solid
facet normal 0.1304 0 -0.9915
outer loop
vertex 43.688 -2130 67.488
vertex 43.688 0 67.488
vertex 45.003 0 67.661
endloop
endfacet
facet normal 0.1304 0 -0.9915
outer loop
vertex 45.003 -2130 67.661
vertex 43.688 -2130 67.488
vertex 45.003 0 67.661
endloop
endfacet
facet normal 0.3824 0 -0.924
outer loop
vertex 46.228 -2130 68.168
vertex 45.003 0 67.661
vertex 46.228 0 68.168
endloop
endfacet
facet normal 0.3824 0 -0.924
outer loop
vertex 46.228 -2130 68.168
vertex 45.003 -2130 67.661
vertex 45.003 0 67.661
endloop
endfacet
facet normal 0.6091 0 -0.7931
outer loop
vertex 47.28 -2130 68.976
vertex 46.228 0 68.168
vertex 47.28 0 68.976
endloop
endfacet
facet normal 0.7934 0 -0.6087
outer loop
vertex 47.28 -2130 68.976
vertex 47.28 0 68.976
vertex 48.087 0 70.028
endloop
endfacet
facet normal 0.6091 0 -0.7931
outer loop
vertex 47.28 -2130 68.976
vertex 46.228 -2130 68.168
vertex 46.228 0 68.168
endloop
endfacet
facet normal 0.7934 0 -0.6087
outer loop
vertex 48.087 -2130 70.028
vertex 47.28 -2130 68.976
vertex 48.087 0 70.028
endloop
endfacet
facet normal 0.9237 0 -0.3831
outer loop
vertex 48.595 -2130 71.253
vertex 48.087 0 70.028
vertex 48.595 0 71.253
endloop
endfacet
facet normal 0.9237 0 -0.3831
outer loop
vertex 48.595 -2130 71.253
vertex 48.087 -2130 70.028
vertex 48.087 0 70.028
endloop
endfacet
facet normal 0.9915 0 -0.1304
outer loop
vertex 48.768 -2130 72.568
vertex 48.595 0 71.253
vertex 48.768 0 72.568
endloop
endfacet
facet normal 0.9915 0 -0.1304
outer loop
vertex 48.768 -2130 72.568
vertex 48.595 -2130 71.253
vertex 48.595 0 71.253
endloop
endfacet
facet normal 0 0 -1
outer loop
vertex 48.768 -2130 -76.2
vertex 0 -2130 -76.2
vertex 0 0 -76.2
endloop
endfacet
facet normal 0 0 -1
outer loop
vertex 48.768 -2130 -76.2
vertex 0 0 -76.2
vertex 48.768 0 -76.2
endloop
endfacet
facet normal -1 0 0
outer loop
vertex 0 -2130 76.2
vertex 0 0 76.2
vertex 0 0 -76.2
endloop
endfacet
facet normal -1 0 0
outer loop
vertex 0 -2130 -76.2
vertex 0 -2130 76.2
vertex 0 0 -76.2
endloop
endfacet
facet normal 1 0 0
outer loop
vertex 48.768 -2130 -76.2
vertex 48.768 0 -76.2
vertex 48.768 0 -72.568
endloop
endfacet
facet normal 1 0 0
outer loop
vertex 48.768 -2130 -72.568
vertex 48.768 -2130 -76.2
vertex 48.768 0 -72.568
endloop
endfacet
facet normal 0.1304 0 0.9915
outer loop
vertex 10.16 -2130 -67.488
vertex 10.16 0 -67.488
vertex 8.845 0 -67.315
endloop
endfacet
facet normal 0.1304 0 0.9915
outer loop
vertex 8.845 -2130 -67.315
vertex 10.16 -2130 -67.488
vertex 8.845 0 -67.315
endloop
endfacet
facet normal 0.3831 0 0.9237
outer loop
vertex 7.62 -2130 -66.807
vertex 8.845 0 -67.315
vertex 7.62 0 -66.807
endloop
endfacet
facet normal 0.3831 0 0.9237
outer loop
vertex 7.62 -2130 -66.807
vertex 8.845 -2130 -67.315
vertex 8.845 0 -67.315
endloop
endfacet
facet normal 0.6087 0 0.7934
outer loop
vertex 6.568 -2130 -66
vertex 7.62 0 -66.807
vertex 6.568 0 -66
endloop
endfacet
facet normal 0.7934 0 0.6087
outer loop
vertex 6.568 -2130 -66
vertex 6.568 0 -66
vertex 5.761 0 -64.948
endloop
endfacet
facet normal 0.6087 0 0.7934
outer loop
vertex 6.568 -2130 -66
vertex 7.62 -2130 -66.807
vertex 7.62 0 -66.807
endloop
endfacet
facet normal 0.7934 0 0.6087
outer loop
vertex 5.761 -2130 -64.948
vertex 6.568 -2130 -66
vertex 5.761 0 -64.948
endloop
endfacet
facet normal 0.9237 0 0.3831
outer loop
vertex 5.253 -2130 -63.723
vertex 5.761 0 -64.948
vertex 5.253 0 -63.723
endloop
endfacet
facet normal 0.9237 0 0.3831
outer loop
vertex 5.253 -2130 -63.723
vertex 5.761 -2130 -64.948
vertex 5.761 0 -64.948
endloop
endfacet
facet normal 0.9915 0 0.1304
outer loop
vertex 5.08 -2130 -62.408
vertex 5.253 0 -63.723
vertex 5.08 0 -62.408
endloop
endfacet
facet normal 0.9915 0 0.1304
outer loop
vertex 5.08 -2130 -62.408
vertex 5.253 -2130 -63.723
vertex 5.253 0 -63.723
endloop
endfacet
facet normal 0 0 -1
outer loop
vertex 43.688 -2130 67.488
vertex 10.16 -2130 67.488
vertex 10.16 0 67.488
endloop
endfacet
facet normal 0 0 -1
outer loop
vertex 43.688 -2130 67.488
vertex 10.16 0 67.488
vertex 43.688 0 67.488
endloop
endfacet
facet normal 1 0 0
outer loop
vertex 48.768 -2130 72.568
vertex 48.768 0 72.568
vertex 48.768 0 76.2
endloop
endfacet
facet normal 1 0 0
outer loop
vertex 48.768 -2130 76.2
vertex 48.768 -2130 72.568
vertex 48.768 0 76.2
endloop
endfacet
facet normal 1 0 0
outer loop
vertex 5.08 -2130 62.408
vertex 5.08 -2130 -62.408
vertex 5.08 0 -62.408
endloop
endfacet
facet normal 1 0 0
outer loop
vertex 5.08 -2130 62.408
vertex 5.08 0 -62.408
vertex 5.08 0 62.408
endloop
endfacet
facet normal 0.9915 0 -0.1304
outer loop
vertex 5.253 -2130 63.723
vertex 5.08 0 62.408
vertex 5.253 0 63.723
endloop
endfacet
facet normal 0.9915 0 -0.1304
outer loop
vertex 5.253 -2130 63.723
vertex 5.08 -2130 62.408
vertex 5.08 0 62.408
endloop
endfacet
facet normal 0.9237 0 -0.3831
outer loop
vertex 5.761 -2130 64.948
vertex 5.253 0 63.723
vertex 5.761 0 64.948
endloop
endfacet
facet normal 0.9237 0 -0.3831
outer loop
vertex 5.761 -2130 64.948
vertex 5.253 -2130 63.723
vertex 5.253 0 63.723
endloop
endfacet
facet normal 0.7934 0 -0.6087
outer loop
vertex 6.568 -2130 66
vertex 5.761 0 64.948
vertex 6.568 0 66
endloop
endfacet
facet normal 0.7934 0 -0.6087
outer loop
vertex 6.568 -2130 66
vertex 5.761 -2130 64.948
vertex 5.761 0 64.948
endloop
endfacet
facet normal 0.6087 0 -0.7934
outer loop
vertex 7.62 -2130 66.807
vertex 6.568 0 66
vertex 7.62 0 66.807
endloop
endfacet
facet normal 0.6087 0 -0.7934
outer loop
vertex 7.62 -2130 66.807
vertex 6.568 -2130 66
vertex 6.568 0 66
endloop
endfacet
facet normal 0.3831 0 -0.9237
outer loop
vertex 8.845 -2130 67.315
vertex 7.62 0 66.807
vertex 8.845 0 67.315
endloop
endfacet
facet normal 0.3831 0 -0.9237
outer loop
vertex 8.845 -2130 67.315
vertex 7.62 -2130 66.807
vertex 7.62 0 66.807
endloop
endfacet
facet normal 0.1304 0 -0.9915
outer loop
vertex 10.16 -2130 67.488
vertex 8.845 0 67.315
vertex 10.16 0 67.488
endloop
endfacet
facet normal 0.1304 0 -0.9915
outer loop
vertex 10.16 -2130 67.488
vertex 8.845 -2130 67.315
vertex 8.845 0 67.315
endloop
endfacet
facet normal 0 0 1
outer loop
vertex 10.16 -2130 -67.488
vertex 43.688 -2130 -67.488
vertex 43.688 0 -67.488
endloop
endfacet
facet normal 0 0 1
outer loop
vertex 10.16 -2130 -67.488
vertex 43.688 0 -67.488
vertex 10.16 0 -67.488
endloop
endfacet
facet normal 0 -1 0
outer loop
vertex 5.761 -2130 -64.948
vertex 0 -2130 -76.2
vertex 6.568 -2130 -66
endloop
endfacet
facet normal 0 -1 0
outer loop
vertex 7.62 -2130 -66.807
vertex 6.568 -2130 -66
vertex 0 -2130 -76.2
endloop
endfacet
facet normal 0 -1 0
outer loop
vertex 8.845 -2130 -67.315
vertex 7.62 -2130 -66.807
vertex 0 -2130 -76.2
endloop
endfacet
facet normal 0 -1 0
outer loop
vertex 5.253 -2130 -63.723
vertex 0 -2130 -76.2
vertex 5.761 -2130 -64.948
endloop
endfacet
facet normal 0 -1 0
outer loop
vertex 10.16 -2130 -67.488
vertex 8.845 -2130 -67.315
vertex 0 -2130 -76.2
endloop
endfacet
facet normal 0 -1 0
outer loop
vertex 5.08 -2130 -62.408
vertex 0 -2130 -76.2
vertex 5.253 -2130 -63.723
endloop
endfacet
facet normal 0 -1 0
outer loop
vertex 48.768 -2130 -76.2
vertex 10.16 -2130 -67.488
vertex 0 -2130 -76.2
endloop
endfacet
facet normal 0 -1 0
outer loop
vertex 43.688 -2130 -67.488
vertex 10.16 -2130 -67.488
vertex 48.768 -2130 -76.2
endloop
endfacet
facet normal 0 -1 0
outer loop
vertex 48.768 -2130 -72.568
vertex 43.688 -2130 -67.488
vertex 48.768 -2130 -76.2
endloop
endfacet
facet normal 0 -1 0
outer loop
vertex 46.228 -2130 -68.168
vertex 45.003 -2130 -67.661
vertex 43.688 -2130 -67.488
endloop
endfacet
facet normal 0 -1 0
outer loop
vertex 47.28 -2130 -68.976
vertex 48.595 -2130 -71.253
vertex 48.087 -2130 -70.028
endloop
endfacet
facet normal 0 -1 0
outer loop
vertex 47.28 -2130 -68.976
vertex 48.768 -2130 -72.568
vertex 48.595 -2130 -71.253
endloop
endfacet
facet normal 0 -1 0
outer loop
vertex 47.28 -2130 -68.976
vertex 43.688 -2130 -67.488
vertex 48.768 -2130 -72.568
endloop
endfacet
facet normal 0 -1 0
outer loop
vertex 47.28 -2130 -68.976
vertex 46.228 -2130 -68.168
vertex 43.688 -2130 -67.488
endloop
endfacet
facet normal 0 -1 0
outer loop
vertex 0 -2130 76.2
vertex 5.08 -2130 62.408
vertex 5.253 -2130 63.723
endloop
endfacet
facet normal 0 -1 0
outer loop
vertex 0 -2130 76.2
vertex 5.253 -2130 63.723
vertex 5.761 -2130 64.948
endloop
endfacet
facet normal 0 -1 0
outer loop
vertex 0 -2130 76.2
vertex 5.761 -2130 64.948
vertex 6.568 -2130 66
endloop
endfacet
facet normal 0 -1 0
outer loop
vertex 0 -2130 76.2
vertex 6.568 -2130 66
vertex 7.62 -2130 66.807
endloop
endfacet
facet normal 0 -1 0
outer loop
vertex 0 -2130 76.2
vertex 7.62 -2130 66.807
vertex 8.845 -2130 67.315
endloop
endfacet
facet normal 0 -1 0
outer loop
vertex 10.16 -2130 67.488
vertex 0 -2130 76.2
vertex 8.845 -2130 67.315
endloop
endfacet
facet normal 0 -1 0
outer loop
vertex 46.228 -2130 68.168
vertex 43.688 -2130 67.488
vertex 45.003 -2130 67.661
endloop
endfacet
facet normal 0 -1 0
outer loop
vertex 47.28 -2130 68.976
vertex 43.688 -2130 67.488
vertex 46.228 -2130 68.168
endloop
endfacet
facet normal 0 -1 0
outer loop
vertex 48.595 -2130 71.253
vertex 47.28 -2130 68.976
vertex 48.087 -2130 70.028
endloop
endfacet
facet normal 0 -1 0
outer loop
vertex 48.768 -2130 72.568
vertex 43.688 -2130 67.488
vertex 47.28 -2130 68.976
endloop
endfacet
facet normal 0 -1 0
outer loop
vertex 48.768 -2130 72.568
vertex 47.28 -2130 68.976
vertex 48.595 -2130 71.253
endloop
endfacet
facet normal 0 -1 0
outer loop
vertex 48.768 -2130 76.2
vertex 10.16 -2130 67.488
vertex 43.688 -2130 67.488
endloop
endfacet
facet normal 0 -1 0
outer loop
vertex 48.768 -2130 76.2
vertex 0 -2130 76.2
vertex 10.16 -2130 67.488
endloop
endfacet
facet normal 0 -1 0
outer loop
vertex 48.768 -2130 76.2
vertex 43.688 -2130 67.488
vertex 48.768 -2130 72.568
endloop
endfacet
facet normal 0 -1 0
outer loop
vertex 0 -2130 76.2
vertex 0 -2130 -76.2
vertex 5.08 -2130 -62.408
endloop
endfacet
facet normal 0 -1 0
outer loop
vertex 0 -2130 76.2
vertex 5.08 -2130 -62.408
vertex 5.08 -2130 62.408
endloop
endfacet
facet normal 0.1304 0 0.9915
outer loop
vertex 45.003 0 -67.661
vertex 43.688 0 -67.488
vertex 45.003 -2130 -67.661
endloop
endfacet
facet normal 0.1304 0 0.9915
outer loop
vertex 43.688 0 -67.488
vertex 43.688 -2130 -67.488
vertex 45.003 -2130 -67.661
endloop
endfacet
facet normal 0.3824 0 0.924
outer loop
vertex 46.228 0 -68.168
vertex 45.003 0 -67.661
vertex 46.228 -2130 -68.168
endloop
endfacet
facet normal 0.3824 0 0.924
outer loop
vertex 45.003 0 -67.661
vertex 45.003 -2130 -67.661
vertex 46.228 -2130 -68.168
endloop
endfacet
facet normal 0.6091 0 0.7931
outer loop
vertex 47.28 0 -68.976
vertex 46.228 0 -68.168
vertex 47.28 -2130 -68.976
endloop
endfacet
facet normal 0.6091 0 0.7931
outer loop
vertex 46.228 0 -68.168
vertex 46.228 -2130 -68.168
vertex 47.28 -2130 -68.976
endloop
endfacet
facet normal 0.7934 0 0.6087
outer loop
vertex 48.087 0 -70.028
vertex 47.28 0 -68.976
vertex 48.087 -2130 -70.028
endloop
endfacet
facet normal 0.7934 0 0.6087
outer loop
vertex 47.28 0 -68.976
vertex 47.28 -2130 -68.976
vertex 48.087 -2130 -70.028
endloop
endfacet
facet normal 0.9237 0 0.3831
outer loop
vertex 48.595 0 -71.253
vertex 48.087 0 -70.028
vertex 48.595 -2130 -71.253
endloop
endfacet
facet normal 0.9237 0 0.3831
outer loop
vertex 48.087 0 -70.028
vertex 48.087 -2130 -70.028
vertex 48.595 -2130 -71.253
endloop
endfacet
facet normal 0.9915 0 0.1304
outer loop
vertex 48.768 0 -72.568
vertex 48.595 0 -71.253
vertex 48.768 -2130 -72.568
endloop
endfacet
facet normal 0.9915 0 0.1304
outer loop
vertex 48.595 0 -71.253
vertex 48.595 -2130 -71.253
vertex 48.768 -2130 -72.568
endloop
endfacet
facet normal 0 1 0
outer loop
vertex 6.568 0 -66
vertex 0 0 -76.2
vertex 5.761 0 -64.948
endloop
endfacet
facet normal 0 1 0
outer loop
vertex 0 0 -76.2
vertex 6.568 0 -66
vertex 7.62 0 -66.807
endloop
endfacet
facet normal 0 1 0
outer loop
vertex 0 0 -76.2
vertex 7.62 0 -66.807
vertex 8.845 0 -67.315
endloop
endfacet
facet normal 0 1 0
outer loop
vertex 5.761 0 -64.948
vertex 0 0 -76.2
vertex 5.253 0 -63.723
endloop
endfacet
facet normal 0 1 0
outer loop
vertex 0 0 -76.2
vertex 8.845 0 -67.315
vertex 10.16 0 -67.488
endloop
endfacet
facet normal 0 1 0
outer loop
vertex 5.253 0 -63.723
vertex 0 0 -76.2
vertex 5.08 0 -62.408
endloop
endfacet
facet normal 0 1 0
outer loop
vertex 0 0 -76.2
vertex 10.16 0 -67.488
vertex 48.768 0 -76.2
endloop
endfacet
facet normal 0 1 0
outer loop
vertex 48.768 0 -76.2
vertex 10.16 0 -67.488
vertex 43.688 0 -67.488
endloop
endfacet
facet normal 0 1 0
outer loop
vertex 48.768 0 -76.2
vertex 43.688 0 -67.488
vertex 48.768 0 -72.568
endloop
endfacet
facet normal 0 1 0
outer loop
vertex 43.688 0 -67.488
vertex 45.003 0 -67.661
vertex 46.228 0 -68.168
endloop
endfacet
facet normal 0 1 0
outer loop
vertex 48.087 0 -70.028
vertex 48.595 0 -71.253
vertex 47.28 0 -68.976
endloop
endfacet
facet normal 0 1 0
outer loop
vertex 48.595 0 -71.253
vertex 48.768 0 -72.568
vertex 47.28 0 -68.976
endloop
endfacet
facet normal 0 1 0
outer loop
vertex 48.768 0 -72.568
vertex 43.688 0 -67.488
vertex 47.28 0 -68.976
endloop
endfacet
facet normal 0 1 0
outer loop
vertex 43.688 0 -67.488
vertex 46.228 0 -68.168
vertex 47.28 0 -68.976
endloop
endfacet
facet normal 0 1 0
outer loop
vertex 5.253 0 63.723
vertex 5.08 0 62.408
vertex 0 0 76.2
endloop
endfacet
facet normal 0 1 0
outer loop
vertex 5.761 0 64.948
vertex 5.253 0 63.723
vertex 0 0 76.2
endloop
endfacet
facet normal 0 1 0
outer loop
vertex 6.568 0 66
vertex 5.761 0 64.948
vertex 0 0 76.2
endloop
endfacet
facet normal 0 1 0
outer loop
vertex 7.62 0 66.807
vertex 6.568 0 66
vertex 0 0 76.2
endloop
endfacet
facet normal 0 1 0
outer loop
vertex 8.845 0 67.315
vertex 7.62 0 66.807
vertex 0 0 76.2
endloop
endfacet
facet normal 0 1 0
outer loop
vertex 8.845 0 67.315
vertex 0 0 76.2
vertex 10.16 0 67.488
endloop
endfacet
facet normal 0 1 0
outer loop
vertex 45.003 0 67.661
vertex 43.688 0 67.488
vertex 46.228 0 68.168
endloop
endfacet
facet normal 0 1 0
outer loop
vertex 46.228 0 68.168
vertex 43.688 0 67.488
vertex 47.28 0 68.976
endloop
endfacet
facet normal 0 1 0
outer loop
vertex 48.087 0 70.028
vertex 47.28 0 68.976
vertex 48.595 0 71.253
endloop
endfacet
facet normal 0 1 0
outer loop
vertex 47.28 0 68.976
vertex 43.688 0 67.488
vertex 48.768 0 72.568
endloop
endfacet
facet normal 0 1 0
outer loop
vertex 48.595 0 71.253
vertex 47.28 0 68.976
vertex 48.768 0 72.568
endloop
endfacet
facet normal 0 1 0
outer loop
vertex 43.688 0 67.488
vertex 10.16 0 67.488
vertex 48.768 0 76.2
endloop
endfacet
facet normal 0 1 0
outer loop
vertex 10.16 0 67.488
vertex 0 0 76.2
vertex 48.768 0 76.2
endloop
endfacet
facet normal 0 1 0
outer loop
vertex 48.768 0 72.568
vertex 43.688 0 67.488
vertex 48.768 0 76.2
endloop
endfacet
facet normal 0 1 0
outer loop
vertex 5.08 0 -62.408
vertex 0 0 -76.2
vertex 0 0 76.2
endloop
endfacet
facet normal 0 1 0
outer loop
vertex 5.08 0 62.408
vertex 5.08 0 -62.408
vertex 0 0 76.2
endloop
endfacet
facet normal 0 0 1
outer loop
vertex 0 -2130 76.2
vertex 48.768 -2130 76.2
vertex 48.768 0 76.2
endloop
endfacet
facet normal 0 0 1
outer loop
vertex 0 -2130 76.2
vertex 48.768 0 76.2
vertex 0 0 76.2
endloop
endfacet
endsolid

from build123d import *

# Parameters (mm, degrees)
F1_DEPTH = 2130
F2_R     = 5.08
F3_R     = 5.08


with BuildPart() as f1:
    # F0 (on Front) → F1 (new body)
    with BuildSketch(Plane.XZ):
        Polygon((48.768, 76.2), (0, 76.2), (0, 0), (5.08, 0), (5.08, 67.4878), (48.768, 67.4878), align=None)
        Polygon((5.08, 0), (0, 0), (0, -76.2), (48.768, -76.2), (48.768, -67.4878), (5.08, -67.4878), align=None)
    extrude(amount=F1_DEPTH)

    # F2
    f2_edges = [f1.edges().sort_by_distance(p)[0] for p in [
        (5.08, -1065, -67.4878),
        (5.08, -1065, 67.4878),
    ]]
    fillet(f2_edges, radius=F2_R)

    # F3
    f3_edges = [f1.edges().sort_by_distance(p)[0] for p in [
        (48.768, -1065, 67.4878),
        (48.768, -1065, -67.4878),
    ]]
    fillet(f3_edges, radius=F3_R)


solid = f1.part
